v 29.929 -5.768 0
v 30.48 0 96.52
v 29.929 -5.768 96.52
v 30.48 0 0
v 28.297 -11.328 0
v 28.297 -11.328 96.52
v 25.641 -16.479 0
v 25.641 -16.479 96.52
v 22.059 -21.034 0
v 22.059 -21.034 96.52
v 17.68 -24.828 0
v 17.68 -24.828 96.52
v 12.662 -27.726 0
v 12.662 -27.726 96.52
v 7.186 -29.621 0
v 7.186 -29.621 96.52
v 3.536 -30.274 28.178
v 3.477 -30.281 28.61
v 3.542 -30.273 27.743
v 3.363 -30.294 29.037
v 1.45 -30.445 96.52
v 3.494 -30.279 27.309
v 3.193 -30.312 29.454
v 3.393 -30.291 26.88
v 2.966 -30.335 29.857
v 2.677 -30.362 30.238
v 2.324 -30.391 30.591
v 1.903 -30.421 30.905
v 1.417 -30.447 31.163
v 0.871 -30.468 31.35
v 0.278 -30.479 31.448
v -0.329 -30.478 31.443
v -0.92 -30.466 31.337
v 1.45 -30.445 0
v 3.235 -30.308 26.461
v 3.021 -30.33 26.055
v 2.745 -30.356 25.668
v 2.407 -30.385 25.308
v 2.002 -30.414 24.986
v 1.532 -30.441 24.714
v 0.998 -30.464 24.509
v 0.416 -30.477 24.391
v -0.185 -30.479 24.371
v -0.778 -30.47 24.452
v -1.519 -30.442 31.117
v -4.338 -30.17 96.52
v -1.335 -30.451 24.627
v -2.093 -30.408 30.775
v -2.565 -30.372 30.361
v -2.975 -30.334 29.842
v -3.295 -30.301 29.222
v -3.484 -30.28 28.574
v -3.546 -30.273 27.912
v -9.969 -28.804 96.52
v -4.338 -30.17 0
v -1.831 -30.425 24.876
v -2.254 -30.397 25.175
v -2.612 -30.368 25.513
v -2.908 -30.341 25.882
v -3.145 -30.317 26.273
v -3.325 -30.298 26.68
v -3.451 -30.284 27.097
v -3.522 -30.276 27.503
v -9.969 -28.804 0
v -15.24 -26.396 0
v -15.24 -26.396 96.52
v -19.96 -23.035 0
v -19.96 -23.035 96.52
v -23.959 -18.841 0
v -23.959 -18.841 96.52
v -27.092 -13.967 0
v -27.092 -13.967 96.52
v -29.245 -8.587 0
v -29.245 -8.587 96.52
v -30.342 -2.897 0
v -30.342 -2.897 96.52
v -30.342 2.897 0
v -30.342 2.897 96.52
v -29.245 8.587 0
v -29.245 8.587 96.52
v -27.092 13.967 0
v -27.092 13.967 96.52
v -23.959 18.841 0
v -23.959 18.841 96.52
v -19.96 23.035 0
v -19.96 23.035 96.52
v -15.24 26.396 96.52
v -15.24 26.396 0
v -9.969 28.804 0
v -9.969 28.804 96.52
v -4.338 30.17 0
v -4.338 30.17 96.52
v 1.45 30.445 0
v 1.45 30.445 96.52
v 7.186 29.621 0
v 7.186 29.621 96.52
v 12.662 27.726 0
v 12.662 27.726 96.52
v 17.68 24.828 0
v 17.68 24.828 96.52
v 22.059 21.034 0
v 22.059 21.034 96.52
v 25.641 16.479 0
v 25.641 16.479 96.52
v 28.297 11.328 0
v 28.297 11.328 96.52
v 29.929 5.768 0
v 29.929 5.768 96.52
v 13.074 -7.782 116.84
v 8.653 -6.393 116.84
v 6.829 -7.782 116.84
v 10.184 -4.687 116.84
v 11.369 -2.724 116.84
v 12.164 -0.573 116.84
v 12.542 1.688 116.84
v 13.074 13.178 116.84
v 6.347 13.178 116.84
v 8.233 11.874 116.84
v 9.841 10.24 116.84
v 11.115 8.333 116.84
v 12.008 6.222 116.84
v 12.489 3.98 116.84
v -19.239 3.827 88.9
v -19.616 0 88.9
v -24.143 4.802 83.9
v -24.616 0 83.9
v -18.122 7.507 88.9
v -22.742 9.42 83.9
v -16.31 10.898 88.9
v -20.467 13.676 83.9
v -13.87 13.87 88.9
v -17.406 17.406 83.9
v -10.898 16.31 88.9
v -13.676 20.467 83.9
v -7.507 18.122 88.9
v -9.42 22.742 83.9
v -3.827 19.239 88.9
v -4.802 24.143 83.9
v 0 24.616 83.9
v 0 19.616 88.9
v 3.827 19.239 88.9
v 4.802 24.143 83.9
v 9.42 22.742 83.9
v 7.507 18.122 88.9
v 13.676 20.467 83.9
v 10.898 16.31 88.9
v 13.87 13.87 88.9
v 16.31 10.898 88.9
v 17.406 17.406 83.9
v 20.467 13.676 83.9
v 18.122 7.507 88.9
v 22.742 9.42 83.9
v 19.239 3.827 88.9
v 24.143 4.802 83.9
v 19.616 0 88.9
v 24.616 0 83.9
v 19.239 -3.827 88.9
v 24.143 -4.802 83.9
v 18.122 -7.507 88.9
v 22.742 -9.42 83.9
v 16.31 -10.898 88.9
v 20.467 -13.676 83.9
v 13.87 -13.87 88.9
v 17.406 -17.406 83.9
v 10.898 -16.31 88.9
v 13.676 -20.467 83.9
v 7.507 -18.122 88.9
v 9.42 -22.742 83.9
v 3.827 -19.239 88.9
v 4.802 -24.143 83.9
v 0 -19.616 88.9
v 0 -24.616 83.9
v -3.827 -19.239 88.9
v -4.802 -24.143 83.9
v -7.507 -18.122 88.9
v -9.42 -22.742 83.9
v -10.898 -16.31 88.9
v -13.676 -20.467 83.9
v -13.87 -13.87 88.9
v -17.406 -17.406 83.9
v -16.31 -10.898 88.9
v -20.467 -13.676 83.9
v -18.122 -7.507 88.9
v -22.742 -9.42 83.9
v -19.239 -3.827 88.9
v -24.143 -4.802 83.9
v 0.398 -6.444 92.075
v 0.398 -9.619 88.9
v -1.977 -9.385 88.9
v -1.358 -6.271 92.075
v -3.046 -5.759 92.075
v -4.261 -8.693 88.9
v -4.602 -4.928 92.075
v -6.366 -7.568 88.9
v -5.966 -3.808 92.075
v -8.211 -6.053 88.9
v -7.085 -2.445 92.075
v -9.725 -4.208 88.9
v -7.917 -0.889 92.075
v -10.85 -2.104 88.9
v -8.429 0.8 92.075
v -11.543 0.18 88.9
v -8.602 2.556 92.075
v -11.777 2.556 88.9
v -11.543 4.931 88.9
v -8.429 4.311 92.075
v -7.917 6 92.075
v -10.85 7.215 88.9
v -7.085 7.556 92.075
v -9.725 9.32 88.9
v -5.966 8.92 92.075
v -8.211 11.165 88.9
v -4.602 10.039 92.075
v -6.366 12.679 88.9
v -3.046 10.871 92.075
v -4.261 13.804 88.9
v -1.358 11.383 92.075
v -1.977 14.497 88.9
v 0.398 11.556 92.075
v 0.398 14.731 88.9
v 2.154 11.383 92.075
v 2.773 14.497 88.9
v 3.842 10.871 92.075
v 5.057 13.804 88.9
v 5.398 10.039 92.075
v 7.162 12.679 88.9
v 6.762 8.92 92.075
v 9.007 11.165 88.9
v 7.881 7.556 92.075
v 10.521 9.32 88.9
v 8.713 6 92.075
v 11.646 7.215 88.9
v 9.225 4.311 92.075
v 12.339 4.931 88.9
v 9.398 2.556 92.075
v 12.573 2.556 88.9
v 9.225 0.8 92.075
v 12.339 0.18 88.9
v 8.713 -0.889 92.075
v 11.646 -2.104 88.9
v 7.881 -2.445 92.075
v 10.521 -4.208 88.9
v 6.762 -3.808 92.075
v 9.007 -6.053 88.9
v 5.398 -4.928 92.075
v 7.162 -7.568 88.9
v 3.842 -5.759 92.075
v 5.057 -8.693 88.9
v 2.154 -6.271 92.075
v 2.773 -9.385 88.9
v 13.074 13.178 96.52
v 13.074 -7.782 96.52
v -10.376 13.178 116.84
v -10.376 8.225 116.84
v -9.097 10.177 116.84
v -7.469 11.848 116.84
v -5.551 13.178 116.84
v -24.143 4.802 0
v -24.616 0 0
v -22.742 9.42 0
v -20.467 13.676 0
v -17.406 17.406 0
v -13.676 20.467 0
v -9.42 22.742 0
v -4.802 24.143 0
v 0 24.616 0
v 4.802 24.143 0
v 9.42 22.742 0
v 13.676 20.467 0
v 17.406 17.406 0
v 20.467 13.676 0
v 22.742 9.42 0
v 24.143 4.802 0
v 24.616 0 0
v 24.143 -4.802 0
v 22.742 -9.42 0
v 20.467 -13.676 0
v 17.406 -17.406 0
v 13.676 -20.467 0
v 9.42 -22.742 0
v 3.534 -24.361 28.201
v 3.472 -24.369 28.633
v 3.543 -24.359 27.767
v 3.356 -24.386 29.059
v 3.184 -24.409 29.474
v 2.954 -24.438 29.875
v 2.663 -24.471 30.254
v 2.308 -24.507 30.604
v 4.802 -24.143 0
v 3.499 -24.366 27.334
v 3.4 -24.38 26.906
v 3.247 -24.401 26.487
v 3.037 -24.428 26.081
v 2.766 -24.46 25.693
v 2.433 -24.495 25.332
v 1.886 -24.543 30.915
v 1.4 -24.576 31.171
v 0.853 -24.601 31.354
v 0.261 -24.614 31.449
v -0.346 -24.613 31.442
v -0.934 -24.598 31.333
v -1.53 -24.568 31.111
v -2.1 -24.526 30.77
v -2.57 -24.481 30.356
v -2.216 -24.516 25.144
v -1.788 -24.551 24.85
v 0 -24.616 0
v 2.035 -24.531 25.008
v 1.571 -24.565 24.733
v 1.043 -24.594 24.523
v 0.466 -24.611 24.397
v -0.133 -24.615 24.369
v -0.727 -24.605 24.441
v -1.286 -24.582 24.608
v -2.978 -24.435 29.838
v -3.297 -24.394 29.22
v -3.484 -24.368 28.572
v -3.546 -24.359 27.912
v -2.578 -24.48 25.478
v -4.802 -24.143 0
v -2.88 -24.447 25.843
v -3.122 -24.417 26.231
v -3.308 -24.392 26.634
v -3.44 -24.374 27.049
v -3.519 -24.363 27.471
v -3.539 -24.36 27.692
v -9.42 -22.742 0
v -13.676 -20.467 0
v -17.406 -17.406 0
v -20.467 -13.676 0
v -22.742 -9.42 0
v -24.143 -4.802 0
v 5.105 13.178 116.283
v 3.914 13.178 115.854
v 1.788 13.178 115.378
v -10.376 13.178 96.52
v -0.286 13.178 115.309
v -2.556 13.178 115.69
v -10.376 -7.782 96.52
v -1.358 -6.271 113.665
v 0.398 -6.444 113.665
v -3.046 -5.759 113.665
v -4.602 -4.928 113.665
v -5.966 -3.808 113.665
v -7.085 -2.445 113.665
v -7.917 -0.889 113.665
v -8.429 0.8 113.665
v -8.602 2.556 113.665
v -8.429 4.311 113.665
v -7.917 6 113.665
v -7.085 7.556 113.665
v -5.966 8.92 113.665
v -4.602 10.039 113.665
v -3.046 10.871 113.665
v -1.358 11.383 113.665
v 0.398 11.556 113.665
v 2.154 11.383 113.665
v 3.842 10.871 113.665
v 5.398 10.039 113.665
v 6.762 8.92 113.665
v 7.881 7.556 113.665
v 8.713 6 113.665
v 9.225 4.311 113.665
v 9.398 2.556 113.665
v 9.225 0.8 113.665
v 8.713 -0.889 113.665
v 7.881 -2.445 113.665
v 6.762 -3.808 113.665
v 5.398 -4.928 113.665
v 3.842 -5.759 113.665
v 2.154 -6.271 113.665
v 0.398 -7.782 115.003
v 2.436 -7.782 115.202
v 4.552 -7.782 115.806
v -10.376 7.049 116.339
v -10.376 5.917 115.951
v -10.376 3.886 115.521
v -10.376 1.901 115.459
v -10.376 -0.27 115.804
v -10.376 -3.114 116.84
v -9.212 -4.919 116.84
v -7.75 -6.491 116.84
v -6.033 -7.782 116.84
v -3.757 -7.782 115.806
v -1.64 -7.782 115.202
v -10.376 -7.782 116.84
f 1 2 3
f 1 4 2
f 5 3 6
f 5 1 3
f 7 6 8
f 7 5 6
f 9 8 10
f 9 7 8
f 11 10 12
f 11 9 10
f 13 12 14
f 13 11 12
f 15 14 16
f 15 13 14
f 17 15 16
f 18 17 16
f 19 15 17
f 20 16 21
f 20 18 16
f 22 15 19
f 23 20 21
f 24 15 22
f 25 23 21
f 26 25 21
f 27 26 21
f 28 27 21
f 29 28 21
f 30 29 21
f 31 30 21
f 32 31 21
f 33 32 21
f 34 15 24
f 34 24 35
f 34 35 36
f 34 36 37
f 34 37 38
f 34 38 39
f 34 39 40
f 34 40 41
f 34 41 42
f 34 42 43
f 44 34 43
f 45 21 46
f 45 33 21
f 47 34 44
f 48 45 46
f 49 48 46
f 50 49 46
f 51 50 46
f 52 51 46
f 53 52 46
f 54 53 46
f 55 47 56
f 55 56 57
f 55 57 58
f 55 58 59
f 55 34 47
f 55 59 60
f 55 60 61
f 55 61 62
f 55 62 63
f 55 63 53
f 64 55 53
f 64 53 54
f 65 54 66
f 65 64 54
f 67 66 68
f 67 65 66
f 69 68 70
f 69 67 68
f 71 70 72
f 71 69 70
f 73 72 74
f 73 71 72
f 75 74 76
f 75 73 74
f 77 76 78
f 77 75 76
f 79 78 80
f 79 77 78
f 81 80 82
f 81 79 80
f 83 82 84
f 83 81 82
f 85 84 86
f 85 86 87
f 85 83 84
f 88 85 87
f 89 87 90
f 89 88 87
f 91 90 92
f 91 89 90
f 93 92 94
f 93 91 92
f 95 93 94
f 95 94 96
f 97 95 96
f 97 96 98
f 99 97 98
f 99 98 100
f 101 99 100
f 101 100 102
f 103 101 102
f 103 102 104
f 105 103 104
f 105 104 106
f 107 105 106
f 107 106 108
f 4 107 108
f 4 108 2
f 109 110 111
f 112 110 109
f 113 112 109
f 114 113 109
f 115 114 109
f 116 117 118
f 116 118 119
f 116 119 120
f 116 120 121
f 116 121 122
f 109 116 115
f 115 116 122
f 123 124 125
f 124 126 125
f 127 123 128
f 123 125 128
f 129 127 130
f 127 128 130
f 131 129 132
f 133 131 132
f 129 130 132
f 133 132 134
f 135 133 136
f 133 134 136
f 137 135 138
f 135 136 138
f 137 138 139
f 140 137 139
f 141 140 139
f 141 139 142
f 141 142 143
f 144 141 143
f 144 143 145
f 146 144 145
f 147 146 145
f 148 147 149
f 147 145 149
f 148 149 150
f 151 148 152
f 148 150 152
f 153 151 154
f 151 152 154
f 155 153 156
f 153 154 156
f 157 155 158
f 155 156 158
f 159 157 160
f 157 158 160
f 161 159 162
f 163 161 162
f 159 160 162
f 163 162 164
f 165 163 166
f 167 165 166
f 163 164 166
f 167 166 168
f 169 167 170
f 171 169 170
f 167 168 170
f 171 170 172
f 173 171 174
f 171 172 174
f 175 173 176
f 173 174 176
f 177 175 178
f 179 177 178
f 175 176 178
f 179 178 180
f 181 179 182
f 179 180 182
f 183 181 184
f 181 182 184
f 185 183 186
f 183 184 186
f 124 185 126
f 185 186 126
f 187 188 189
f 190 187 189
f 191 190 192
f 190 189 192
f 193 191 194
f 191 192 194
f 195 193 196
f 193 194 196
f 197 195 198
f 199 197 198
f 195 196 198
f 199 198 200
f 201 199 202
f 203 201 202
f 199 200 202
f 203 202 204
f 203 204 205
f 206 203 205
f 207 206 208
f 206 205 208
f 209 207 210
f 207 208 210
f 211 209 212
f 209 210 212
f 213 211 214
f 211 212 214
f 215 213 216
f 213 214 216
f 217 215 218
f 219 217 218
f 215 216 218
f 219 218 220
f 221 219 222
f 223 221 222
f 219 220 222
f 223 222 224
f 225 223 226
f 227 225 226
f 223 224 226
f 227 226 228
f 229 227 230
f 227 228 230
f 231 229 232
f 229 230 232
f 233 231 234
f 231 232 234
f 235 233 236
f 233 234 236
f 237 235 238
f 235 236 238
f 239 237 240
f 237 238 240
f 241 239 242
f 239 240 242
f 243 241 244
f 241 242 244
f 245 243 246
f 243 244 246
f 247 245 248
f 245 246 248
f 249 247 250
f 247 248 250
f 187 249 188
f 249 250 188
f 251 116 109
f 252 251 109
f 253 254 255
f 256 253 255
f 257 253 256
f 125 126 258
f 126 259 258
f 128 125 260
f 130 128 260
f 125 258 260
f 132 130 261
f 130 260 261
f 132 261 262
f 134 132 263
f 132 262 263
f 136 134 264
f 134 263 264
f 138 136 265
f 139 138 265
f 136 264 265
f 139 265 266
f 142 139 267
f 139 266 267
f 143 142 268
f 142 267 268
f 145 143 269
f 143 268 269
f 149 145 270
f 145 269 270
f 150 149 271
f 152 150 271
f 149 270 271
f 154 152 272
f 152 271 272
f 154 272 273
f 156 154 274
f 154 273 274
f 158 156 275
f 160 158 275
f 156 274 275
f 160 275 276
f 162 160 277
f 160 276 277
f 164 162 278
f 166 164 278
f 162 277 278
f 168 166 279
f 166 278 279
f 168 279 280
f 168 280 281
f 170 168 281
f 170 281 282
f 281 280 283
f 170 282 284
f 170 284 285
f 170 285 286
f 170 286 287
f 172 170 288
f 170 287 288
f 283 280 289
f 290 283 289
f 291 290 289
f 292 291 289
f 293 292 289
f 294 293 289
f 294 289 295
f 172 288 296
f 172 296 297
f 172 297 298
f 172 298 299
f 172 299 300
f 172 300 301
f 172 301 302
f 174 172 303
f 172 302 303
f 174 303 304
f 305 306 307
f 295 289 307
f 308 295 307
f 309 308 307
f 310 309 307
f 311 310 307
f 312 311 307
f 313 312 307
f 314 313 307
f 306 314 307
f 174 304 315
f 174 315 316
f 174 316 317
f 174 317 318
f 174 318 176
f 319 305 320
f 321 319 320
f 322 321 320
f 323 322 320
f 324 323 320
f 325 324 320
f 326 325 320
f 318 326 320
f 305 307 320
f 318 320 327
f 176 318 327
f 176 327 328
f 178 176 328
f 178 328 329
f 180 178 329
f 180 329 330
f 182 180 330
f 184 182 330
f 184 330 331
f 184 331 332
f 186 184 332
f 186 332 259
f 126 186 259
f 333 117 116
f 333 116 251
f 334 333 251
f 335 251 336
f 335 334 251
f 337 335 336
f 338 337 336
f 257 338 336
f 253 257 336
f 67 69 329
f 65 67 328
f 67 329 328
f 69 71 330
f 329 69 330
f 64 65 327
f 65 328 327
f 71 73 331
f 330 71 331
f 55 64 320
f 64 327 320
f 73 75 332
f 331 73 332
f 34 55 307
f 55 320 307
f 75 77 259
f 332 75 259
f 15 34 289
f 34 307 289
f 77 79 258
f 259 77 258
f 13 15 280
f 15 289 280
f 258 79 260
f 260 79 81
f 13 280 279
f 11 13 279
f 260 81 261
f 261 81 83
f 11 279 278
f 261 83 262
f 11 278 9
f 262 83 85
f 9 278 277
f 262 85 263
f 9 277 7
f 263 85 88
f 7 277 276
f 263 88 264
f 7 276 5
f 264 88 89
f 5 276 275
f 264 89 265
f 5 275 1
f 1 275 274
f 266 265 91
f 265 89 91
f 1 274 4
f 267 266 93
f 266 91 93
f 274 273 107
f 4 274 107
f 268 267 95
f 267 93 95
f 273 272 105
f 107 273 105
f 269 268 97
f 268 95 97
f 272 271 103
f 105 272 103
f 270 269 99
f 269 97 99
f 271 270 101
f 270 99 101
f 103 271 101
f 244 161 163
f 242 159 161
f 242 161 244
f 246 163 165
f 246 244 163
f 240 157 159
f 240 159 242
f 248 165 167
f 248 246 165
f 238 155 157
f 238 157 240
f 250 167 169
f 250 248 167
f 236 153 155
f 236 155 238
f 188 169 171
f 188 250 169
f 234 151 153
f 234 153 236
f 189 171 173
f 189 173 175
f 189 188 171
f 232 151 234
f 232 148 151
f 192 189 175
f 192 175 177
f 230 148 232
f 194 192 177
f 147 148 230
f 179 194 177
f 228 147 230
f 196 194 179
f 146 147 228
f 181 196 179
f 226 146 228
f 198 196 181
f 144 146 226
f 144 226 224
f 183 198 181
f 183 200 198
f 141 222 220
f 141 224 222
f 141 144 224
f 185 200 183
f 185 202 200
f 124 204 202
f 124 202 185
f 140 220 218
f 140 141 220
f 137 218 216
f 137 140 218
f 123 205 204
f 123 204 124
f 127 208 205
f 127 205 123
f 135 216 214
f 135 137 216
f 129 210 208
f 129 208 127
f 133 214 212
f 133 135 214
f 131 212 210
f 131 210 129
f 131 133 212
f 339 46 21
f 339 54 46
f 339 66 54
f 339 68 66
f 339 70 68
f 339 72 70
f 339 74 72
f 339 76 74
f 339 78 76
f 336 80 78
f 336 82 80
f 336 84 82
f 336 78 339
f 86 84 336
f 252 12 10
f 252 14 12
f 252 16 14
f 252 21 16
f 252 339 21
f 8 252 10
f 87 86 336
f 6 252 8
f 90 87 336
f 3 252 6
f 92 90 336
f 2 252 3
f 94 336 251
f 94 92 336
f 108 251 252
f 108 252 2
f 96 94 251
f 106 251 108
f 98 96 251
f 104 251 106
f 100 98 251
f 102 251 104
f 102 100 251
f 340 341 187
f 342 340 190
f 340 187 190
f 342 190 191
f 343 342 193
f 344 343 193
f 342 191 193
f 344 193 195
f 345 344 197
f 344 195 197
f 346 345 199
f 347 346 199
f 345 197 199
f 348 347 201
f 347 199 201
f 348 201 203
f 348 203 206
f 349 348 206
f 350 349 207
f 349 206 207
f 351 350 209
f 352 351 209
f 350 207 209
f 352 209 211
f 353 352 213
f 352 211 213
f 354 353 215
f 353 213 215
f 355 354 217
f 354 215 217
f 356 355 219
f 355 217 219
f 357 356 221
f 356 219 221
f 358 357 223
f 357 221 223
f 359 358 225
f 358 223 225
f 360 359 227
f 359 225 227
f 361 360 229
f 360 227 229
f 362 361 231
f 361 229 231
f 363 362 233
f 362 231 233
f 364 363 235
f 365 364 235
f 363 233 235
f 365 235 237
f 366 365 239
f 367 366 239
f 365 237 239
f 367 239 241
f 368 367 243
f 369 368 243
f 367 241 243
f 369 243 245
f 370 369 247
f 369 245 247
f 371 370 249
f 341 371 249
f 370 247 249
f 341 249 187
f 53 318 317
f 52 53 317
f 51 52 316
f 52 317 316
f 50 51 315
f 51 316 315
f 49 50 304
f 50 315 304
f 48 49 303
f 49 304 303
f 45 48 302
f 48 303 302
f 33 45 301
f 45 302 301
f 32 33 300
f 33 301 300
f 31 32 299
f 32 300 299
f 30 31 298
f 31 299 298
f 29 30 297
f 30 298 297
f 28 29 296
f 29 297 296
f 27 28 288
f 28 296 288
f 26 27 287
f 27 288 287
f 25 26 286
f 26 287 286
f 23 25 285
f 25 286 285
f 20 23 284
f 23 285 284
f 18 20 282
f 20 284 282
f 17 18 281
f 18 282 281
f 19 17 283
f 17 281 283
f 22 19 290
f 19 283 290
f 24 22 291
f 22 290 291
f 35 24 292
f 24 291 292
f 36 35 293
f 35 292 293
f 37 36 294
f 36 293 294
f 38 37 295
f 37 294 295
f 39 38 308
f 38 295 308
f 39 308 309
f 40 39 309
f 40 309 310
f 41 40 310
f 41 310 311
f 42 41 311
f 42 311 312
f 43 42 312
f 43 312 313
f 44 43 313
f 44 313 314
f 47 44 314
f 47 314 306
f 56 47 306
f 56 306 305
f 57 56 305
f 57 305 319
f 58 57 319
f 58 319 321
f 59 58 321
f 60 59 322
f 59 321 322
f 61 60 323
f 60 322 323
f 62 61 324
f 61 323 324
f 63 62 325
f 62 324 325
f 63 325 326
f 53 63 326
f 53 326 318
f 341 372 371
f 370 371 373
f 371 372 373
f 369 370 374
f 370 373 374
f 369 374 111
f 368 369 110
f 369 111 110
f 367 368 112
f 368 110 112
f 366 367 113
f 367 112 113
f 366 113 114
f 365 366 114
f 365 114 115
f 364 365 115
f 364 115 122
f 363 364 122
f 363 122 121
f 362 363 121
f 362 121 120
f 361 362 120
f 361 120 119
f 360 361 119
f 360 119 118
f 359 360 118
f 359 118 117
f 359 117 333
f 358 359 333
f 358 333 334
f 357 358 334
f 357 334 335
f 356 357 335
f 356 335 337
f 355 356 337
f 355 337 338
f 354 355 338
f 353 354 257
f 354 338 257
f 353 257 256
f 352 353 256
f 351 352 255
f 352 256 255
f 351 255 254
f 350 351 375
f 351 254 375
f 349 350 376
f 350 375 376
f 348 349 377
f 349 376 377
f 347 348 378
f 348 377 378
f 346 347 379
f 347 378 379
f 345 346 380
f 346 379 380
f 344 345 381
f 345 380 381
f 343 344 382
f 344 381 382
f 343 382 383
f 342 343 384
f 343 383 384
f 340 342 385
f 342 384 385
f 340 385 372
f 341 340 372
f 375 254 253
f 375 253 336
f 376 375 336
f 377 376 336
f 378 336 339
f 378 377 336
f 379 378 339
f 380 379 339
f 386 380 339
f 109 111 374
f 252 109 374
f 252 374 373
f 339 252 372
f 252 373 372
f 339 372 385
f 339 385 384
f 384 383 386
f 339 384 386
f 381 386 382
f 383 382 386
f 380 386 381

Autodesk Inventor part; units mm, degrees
ref_plane "YZ Plane" through (0, 0, 0) normal (1, 0, 0) x (0, 1, 0)
ref_plane "XZ Plane" through (0, 0, 0) normal (0, 1, 0) x (-1, 0, 0)
ref_plane "XY Plane" through (0, 0, 0) normal (0, 0, 1) x (1, 0, 0)
sketch "Sketch1" plane through (0, 0, 0) normal (1, 0, 0) x (0, 1, 0)
  point P0 (0, 0)
sketch "Sketch2" plane through (0, 0, 0) normal (0, 0, 1) x (1, 0, 0)
  circle A0 centre (0, 0) radius 30.48
  dimension "d0" = 60.96
extrude "Extrusion1" add sketch "Sketch2" along normal blind 116.84
sketch "Sketch3" plane through (0, 0, 116.84) normal (0, 0, 1) x (1, 0, 0)
  line L0 (-39.8452, 52.8156) -> (35.072, 52.8156)
  line L1 (35.072, 52.8156) -> (35.072, 13.178)
  line L2 (35.072, 13.178) -> (-39.8452, 13.178)
  line L3 (-39.8452, 13.178) -> (-39.8452, 52.8156)
  line L4 (-67.2387, 32.9968) -> (-10.3763, 32.9968)
  line L5 (-10.3763, 32.9968) -> (-10.3763, -41.1941)
  line L6 (-10.3763, -41.1941) -> (-67.2387, -41.1941)
  line L7 (-67.2387, -41.1941) -> (-67.2387, 32.9968)
  line L8 (-33.6194, -53.8532) -> (43.5806, -53.8532)
  line L9 (43.5806, -53.8532) -> (43.5806, -7.7823)
  line L10 (43.5806, -7.7823) -> (-33.6194, -7.7823)
  line L11 (-33.6194, -7.7823) -> (-33.6194, -53.8532)
  line L12 (52.9193, 35.3833) -> (13.0742, 35.3833)
  line L13 (13.0742, 35.3833) -> (13.0742, -35.1758)
  line L14 (13.0742, -35.1758) -> (52.9193, -35.1758)
  line L15 (52.9193, -35.1758) -> (52.9193, 35.3833)
  point P0 (0, 0)
  point P1 (-10.3763, 13.178)
  point P2 (13.0742, 13.178)
  point P3 (13.0742, -7.7823)
  point P4 (-10.3763, -7.7823)
  point P5 (-39.8452, 32.9968)
  point P6 (-33.6194, -41.1941)
  point P7 (43.5806, -35.1758)
  point P8 (35.072, 35.3833)
extrude "Extrusion2" cut sketch "Sketch3" against normal blind 20.32 contours L0 L1 L12 L13 L2 L5 L4 L3 | L4 L5 L2 L3 | L3 L2 L5 L10 L11 L6 L7 L4 | L12 L15 L14 L9 L10 L13 L2 L1 | L1 L2 L13 L12 | L10 L13 L14 L9 L8 L11 L6 L5 | L5 L6 L11 L10 | L10 L9 L14 L13
sketch "Sketch4" plane through (0, 0, 116.84) normal (0, 0, 1) x (1, 0, 0)
  point P0 (0, 0)
  point P1 (0.3979, 2.5556)
hole "Hole1" at (0.3979, 2.5556, 116.84) direction (0, 0, -1) diameter 18 end through all
sketch "Sketch5" plane through (0, 0, 0) normal (0, 0, -1) x (-1, 0, 0)
  circle A0 centre (0, 0) radius 24.6156
extrude "Extrusion3" cut sketch "Sketch5" against normal blind 88.9
chamfer "Chamfer1" distance 3.175 angle 45 2 edges at (0.3979, 11.5556, 88.9) (0.3979, 11.5556, 116.84)
chamfer "Chamfer2" distance 5 angle 45 1 edges at (24.6156, 0, 88.9)
sketch "Sketch6" plane through (0, 0, 0) normal (0, 1, 0) x (-1, 0, 0)
  circle A0 centre (0, 27.9124) radius 3.5462
  point P0 (0, 0)
extrude "Extrusion4" cut sketch "Sketch6" against normal blind 88.9
properties part number "storage pipe 2"
